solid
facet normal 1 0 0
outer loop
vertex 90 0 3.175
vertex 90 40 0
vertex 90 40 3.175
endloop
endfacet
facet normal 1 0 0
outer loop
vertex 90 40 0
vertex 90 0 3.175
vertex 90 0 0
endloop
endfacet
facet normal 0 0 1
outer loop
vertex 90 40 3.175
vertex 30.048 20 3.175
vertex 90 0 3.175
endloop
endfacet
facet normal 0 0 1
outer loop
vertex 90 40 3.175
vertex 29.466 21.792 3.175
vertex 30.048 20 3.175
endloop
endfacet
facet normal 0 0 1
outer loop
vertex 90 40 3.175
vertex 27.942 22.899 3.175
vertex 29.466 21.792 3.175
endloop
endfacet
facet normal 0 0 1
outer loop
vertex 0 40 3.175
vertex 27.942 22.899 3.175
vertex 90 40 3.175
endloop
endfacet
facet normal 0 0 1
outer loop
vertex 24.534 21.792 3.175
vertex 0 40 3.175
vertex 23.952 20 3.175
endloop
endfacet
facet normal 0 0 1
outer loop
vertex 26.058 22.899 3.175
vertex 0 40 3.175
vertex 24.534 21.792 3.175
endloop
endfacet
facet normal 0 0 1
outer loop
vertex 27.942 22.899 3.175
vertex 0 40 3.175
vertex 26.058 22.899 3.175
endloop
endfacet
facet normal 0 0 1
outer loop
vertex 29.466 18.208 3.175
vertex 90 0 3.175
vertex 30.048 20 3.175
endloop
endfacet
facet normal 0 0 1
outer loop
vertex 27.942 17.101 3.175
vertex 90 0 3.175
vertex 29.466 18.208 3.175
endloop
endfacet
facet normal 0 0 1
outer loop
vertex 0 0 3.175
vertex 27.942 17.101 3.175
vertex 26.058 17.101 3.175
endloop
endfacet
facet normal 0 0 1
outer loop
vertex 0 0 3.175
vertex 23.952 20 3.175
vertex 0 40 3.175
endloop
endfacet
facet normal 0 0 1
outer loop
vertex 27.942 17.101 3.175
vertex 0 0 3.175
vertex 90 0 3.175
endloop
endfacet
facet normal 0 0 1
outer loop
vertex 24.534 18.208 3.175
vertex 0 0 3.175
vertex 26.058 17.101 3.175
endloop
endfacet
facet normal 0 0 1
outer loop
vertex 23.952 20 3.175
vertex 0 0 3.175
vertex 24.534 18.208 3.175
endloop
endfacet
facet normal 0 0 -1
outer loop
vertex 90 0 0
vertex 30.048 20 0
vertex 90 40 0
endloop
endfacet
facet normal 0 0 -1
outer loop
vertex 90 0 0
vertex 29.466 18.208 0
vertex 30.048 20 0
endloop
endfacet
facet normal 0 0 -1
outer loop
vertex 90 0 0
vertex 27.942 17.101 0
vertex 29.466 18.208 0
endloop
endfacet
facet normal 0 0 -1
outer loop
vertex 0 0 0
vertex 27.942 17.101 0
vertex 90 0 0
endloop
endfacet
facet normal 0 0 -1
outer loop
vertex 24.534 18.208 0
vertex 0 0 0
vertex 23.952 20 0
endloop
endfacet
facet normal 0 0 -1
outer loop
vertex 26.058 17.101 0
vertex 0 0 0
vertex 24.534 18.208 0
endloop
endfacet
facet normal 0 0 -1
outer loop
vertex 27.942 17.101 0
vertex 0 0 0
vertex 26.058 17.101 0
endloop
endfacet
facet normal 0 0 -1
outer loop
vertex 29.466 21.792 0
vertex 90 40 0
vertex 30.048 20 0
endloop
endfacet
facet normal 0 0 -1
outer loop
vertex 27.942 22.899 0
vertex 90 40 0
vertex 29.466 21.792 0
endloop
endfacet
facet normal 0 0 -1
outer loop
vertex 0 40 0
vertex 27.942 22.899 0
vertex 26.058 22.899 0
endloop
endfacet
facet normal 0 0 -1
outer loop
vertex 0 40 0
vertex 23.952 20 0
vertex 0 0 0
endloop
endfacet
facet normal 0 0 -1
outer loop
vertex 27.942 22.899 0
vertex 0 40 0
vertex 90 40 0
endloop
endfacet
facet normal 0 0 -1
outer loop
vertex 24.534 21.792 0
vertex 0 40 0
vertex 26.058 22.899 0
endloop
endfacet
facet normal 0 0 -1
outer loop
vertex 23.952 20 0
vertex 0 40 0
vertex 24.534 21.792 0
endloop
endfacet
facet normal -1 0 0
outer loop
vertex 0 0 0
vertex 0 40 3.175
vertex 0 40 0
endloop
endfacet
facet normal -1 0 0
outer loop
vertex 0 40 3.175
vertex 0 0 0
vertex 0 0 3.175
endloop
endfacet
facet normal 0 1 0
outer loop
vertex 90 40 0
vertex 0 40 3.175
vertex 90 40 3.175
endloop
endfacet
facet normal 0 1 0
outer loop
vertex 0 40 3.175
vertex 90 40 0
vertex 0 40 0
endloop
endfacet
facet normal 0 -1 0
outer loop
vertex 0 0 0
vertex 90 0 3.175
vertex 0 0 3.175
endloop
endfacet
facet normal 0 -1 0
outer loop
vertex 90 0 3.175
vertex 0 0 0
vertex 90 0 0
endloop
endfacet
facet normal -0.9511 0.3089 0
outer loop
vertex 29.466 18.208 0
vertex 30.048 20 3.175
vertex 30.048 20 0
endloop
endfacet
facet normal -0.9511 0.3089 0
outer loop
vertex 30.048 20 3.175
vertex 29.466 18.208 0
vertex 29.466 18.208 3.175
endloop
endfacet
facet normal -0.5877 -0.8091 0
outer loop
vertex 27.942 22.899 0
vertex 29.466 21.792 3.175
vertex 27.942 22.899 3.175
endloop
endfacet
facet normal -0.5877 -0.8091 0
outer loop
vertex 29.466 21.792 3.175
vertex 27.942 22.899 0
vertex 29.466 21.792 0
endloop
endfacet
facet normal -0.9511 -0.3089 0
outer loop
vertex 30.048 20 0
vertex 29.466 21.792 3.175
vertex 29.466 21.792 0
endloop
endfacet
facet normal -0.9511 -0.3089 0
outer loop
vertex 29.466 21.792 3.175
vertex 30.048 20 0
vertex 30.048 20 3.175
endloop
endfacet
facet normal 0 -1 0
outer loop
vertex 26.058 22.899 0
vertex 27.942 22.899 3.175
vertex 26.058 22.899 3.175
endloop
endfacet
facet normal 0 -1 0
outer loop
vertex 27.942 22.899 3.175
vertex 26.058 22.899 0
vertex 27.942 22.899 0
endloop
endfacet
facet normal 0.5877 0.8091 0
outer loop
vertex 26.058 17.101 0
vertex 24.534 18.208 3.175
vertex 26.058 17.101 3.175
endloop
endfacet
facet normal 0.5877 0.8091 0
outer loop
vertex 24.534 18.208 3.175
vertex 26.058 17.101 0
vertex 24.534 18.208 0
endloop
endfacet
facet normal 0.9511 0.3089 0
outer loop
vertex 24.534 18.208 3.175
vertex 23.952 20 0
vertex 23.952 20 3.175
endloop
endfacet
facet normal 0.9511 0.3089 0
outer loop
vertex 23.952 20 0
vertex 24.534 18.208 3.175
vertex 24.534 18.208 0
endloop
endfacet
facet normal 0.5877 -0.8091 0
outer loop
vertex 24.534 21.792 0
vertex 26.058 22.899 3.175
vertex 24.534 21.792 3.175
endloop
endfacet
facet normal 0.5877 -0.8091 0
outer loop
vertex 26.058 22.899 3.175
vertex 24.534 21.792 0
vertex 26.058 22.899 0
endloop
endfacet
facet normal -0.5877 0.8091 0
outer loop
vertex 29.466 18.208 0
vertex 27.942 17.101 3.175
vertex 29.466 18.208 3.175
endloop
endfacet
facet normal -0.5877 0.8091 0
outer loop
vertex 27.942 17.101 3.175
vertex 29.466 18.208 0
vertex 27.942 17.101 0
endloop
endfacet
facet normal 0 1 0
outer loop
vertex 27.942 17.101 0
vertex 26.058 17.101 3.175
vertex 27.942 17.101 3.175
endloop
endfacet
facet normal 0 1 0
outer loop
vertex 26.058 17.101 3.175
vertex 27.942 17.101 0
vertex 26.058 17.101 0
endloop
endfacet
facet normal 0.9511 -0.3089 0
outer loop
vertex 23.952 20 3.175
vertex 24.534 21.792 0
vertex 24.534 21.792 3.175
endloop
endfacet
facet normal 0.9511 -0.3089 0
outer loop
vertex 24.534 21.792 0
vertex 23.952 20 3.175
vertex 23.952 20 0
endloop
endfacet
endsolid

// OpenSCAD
th = (1/8)*25.4;
hole_dia = 0.12*25.4;

difference(){
cube([90,40,th]);
//make holes
translate([27,20,0]){
    cylinder(h=th,r=hole_dia);
    }
} 
